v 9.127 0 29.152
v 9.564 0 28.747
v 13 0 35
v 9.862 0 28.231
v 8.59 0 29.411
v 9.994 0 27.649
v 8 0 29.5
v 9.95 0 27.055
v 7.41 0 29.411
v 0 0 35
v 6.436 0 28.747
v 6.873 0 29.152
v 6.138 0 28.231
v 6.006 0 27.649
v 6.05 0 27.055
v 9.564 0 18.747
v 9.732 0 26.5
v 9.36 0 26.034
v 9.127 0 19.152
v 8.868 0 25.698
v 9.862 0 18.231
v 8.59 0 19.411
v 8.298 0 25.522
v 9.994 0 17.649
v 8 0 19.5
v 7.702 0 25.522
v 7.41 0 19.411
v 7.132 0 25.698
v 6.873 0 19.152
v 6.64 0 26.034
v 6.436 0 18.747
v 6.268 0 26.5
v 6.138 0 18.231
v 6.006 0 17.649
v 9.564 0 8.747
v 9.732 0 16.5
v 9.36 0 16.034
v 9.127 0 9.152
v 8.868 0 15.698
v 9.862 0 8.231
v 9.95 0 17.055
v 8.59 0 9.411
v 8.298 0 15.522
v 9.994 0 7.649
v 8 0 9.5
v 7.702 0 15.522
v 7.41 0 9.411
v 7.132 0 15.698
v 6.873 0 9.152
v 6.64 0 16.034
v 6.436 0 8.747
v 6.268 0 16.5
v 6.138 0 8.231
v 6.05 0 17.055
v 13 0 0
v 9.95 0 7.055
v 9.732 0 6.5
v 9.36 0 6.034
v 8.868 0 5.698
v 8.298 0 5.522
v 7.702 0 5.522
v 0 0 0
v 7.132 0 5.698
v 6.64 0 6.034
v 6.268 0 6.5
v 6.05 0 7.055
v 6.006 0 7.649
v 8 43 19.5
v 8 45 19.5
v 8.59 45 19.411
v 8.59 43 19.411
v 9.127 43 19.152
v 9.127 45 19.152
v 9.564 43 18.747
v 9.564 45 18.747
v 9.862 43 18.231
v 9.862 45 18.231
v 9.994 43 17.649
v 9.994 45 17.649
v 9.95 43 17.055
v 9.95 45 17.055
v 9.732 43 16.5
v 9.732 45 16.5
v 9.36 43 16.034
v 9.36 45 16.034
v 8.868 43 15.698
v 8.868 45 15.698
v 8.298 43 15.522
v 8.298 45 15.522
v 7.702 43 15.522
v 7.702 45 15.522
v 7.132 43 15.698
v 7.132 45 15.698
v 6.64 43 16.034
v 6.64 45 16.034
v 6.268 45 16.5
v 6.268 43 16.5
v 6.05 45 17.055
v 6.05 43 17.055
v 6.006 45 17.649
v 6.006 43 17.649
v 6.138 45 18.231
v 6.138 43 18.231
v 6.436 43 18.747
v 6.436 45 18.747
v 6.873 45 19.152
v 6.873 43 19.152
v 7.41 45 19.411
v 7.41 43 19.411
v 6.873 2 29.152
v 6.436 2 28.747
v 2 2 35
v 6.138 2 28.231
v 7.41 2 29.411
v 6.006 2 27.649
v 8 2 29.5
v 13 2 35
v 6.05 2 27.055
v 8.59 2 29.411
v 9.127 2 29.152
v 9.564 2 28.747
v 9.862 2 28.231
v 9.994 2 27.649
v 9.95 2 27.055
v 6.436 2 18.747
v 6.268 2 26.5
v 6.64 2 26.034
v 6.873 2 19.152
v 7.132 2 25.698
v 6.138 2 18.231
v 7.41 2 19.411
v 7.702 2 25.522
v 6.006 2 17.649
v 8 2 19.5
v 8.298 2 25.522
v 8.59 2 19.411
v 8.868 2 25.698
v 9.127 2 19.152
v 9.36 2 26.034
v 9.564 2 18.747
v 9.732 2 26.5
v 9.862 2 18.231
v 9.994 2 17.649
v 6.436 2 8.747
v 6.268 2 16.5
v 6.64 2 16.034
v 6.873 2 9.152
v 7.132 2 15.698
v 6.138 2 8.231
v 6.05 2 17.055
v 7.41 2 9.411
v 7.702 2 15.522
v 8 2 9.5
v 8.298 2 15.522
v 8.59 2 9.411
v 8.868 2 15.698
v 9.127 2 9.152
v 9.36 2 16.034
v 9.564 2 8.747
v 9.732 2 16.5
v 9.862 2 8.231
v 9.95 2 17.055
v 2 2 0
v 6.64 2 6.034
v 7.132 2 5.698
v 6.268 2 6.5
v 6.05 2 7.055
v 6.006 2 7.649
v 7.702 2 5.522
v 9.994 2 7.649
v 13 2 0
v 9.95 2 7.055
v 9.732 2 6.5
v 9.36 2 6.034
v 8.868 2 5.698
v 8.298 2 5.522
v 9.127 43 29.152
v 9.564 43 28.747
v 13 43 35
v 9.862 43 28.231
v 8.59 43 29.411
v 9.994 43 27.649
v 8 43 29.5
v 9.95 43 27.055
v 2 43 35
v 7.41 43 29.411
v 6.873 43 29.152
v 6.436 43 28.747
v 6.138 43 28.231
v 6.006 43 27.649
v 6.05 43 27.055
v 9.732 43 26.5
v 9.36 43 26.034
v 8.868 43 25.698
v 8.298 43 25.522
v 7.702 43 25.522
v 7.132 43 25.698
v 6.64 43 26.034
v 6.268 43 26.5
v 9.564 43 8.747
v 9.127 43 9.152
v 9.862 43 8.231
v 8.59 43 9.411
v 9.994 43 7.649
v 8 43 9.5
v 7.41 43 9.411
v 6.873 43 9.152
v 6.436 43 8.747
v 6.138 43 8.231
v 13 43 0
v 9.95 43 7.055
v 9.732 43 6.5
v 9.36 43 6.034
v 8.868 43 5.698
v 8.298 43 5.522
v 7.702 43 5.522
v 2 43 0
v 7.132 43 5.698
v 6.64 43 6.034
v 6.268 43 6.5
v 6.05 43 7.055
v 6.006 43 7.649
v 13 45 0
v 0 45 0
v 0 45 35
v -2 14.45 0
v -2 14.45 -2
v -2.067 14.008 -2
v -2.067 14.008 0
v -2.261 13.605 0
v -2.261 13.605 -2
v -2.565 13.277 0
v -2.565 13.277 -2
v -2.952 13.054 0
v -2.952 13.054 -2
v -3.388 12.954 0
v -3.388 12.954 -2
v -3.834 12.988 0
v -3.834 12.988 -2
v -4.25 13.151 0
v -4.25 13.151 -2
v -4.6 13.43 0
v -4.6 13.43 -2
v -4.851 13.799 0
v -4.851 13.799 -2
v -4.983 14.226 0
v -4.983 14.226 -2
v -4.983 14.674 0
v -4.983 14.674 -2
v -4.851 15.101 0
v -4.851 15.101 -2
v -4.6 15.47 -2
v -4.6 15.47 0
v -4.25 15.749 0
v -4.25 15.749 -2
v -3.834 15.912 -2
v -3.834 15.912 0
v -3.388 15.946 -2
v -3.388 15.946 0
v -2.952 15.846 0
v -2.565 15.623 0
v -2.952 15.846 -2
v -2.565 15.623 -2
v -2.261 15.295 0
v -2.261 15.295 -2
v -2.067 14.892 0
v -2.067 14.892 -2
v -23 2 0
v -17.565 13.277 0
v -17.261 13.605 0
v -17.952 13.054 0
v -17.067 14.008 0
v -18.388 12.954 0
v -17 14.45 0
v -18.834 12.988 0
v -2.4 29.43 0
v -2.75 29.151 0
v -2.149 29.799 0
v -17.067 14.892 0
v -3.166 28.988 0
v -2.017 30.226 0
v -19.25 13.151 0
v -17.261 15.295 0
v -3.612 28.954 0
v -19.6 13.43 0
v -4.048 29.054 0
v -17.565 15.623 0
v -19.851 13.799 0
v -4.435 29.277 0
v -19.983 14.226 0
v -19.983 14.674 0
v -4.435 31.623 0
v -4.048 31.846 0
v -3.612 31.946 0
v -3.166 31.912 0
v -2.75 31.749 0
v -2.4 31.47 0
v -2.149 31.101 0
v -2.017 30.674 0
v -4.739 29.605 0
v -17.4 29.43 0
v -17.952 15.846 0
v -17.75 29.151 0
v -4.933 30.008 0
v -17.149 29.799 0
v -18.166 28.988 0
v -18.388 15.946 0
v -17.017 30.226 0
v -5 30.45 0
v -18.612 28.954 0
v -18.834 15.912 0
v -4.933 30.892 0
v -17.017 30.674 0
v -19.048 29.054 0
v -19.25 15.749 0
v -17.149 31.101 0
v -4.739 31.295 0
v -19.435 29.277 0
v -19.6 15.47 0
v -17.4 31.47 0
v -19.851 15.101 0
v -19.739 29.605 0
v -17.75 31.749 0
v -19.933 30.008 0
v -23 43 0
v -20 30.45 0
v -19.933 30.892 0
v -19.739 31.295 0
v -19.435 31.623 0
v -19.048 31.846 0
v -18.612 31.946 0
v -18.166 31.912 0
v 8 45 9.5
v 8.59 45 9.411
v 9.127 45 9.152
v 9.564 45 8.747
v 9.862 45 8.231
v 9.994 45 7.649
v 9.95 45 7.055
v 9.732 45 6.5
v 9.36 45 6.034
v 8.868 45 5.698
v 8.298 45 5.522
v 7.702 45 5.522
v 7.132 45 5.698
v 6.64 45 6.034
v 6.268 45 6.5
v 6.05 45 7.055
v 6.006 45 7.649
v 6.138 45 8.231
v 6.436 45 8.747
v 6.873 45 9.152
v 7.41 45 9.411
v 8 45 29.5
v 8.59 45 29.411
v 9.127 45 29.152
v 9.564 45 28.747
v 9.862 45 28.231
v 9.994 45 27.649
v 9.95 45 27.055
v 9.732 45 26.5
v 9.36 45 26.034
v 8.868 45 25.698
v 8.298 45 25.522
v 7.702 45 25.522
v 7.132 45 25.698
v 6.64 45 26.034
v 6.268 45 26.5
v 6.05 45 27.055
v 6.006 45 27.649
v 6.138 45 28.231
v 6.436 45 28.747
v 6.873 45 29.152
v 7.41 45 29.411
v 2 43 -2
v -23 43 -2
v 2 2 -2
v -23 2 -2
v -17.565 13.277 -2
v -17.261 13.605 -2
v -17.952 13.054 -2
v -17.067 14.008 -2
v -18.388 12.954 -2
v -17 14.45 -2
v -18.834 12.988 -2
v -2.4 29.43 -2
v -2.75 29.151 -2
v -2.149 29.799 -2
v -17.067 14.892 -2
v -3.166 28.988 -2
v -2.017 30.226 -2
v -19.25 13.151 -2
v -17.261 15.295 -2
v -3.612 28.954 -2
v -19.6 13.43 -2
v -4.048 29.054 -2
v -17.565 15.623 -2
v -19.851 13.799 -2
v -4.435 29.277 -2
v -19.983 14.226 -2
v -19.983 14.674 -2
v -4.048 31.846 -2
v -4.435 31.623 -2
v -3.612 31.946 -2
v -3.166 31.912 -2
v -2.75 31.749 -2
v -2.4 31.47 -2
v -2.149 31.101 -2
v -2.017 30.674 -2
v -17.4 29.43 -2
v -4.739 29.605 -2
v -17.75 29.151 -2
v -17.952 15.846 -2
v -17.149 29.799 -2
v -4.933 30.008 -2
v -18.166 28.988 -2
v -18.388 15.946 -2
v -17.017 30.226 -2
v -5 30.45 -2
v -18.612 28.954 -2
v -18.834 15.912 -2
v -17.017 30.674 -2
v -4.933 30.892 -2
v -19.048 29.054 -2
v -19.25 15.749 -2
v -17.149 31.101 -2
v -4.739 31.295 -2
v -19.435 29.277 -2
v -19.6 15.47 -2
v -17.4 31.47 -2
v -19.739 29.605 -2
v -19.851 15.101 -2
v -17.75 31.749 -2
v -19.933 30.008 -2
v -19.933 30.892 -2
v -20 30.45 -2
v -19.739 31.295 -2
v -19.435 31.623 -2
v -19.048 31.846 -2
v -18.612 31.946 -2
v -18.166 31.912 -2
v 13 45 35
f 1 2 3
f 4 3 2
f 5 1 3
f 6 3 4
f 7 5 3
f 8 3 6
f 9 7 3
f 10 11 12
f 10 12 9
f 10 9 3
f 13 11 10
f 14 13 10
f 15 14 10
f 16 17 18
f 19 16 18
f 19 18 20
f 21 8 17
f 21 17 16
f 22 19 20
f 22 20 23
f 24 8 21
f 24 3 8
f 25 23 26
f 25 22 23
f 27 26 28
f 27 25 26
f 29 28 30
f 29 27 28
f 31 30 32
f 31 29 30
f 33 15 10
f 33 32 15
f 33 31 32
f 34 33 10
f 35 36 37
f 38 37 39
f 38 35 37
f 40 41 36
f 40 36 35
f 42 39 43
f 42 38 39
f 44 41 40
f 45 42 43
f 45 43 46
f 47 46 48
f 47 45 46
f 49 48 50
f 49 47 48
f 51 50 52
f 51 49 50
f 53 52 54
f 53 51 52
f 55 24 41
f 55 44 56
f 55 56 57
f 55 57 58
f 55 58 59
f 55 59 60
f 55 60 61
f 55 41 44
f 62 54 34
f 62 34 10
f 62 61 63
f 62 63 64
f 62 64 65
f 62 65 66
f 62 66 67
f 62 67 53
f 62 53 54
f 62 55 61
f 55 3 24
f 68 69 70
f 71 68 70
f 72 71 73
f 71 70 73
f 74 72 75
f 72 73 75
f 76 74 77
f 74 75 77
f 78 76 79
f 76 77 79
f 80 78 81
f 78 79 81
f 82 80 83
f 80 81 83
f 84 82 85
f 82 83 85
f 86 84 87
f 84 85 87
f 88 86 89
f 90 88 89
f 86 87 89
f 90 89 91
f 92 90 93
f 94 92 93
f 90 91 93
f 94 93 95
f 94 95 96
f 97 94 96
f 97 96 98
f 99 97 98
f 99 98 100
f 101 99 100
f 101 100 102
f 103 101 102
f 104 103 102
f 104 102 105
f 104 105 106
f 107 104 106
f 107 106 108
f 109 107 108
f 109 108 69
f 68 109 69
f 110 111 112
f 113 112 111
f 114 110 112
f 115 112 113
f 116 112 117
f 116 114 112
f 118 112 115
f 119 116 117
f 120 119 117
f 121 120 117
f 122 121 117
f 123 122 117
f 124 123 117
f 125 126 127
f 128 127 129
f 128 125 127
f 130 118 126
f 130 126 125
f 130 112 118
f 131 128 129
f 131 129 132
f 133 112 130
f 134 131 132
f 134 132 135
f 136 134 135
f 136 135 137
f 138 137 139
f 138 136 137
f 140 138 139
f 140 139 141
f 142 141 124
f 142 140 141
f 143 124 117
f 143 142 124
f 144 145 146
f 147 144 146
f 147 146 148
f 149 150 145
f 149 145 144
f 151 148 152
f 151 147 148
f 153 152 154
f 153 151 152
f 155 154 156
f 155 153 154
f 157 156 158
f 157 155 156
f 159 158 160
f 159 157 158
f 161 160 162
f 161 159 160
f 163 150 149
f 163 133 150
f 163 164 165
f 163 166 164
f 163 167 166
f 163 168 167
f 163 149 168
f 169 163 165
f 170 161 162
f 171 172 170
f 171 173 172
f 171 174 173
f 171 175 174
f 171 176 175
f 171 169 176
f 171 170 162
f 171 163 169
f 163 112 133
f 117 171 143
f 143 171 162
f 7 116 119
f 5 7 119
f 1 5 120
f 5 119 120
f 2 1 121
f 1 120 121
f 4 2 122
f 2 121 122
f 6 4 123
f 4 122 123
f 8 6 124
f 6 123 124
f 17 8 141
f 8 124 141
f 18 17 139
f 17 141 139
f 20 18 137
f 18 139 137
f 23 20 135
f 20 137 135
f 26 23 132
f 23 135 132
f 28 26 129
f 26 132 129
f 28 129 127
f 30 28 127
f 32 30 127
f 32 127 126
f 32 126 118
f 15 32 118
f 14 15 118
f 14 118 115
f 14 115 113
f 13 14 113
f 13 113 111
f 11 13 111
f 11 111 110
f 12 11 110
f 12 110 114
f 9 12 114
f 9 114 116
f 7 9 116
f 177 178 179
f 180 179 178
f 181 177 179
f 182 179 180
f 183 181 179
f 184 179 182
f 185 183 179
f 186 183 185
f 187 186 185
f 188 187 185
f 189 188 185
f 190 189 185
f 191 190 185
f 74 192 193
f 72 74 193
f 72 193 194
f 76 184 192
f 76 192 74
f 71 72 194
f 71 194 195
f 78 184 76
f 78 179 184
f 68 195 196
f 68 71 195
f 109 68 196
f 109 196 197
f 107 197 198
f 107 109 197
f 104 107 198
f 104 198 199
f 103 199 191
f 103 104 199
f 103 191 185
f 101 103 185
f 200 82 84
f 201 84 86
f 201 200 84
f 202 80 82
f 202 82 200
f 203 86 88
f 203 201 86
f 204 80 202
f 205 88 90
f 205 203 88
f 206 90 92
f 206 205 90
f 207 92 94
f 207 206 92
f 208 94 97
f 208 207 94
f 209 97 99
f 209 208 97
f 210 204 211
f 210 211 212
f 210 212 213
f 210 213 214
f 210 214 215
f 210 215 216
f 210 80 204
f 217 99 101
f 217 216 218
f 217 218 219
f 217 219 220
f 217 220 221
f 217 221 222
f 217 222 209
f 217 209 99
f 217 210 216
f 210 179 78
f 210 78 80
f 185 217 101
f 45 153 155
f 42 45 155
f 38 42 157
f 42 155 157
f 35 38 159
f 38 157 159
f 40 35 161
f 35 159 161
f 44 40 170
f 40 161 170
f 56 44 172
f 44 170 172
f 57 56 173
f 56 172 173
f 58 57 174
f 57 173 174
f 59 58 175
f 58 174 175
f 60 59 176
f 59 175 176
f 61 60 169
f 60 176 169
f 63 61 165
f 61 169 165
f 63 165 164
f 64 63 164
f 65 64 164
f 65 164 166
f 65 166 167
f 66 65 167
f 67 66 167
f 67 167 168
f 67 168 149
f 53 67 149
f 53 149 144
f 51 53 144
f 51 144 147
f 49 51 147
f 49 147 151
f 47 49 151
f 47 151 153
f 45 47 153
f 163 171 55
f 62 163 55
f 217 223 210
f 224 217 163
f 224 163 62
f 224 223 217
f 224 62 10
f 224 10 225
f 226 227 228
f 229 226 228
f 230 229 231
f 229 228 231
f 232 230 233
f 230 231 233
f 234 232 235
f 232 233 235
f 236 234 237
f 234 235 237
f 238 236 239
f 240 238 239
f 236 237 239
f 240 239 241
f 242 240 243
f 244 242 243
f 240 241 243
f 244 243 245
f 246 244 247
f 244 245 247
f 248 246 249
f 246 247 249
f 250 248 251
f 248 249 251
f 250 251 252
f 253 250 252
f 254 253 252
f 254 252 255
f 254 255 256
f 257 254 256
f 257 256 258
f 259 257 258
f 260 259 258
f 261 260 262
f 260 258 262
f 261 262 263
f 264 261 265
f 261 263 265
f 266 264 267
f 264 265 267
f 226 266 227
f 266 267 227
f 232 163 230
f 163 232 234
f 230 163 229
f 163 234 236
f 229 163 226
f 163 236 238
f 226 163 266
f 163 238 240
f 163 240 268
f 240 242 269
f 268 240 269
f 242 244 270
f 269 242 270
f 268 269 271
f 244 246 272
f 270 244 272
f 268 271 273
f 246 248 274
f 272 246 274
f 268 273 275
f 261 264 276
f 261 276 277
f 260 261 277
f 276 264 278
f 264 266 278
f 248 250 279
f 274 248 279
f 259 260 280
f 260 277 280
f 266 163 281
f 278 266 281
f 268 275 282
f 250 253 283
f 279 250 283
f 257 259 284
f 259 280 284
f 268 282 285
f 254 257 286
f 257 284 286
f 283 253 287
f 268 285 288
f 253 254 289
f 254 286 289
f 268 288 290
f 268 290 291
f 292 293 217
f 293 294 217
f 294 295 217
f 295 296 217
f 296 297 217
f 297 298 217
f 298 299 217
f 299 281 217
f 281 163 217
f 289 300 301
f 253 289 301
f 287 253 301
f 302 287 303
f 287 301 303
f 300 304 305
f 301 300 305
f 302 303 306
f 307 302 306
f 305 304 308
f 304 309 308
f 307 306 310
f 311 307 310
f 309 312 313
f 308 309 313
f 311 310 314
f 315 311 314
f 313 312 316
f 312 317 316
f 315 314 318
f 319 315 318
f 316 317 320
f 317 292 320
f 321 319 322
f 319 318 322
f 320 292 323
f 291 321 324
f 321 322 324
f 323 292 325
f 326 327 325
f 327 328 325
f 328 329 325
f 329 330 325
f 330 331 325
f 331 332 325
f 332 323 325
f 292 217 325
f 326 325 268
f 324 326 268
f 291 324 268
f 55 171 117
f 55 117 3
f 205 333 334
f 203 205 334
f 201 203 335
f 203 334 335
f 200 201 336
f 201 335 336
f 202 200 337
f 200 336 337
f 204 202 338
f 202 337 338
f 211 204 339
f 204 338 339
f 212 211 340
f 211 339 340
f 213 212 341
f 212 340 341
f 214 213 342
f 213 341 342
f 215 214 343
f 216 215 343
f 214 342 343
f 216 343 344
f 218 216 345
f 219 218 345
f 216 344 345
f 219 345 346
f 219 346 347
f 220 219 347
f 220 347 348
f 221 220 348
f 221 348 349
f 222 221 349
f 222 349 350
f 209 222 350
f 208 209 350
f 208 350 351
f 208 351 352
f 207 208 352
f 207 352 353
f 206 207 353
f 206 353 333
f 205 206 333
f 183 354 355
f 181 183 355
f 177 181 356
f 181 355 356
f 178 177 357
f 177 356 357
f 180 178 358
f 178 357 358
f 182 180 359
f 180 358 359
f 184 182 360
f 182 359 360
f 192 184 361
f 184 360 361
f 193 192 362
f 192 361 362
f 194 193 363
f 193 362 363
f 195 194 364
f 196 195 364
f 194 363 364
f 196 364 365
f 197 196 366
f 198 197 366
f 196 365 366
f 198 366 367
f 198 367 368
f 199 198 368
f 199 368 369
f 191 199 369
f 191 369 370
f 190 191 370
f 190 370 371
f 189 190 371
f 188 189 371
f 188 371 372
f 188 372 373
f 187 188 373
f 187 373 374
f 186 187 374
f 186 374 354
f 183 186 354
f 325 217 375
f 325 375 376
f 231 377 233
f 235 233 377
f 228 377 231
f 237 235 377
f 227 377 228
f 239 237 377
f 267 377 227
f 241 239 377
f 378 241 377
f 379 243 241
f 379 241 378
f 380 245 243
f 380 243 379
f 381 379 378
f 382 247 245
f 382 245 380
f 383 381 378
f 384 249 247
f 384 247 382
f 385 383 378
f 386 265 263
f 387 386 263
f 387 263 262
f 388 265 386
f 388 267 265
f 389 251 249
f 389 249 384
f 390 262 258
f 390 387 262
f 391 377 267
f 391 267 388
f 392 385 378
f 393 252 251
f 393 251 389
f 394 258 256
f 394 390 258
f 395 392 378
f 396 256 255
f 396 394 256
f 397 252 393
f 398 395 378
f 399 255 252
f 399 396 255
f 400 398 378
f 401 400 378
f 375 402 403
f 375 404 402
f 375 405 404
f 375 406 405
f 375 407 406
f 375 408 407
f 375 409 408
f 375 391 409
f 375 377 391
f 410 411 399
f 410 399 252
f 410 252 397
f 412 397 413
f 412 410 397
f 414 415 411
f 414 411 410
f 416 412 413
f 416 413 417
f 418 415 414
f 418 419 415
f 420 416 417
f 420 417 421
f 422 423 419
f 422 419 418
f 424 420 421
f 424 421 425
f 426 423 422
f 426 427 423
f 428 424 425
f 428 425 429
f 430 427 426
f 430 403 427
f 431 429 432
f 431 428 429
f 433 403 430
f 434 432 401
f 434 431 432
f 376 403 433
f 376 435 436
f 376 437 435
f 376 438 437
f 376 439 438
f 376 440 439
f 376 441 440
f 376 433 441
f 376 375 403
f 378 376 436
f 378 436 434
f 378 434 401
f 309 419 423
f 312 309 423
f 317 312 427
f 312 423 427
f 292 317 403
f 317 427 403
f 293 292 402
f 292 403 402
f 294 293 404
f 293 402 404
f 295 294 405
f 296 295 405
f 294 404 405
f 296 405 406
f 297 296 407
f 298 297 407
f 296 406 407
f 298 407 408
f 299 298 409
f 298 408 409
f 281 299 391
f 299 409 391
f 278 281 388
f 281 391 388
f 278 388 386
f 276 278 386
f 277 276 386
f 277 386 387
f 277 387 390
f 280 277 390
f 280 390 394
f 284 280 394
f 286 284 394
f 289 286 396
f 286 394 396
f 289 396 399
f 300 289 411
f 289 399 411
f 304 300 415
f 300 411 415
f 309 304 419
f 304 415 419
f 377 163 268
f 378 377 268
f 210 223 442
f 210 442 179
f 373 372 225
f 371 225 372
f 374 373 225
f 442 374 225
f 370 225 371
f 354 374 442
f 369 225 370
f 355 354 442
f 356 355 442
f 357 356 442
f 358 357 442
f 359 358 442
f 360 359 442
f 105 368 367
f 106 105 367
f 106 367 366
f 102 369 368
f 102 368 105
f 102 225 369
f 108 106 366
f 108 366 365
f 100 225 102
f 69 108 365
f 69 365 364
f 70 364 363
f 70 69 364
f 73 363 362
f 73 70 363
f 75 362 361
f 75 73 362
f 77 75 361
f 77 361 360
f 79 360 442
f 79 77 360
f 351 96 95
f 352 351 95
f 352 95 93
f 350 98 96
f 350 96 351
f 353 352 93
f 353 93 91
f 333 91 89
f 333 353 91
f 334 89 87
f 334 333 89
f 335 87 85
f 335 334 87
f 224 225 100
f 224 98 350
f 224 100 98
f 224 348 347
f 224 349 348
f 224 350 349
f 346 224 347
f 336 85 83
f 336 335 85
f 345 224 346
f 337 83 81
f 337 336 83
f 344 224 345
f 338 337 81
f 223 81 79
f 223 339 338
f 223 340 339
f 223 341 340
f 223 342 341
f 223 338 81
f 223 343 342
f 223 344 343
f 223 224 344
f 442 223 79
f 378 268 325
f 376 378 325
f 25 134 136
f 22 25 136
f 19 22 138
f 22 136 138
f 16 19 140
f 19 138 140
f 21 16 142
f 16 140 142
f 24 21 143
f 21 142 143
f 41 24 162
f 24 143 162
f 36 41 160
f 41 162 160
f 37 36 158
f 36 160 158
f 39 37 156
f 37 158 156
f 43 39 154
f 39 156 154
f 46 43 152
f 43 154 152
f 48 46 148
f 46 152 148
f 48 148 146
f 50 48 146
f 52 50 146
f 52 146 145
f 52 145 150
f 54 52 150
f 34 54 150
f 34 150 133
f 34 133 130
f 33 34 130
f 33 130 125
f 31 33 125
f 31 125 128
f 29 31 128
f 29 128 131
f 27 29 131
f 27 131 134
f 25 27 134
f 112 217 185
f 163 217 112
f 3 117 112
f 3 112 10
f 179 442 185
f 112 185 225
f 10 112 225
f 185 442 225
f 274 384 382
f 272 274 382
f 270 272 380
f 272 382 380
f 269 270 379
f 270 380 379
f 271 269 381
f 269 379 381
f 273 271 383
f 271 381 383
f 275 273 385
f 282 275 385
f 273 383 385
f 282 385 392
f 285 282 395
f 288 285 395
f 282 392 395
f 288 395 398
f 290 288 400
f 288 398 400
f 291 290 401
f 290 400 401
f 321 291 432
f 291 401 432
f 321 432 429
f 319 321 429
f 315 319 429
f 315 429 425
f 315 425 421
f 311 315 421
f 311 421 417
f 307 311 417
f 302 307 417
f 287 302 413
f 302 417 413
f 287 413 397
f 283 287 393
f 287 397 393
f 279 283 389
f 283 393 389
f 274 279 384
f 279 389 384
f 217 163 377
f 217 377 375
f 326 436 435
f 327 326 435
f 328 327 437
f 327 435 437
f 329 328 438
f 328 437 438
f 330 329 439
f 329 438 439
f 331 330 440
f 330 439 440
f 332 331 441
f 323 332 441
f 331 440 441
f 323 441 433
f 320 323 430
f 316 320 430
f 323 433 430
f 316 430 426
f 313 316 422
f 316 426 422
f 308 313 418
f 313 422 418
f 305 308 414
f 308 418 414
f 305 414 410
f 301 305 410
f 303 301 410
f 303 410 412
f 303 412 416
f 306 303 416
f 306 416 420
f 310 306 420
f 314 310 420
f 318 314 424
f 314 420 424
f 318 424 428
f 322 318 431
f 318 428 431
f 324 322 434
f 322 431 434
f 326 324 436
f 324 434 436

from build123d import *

# Parameters (mm, degrees)
BOSS_EXTRUDE1_DEPTH = 35
SKETCH2_W           = 25
SKETCH2_H           = 41
BOSS_EXTRUDE2_DEPTH = 2
SKETCH3_R           = 1.5
CUT_EXTRUDE1_DEPTH  = 2
SKETCH4_R           = 2
CUT_EXTRUDE2_DEPTH  = 62.473571557


with BuildPart() as part:
    # Sketch1 → Boss-Extrude1 (new body)
    with BuildSketch(Plane.XY):
        Polygon((0, 0), (0, 45), (13, 45), (13, 43), (2, 43), (2, 2), (13, 2), (13, 0), align=None)
    extrude(amount=BOSS_EXTRUDE1_DEPTH)

    # Sketch4 → Cut-Extrude2 (cut, through all)
    with BuildSketch(Plane(origin=(0, 45, 0), x_dir=(1, 0, 0), z_dir=(0, 1, 0))):
        with Locations(Location((8, -17.5, 0), (0, 0, 270))):
            Circle(SKETCH4_R)
        with Locations(Location((8, -27.5, 0), (0, 0, 270))):
            Circle(SKETCH4_R)
        with Locations(Location((8, -7.5, 0), (0, 0, 270))):
            Circle(SKETCH4_R)
    extrude(amount=-CUT_EXTRUDE2_DEPTH, mode=Mode.SUBTRACT)


with BuildPart() as body_2:
    # Sketch2 → Boss-Extrude2 (new body)
    with BuildSketch(Plane(origin=(0, 0, 0), x_dir=(-1, 0, 0), z_dir=(0, 0, -1))):
        with Locations((10.5, 22.5)):
            Rectangle(SKETCH2_W, SKETCH2_H)
    extrude(amount=BOSS_EXTRUDE2_DEPTH)

    # Sketch3 → Cut-Extrude1 (cut)
    with BuildSketch(Plane(origin=(0, 0, -2), x_dir=(-1, 0, 0), z_dir=(0, 0, -1))):
        with Locations((18.5, 30.45)):
            Circle(SKETCH3_R)
        with Locations((3.5, 30.45)):
            Circle(SKETCH3_R)
        with Locations(Location((18.5, 14.45, 0), (0, 0, 180))):
            Circle(SKETCH3_R)
        with Locations(Location((3.5, 14.45, 0), (0, 0, 180))):
            Circle(SKETCH3_R)
    extrude(amount=-CUT_EXTRUDE1_DEPTH, mode=Mode.SUBTRACT)


solid = Compound([part.part, body_2.part])
